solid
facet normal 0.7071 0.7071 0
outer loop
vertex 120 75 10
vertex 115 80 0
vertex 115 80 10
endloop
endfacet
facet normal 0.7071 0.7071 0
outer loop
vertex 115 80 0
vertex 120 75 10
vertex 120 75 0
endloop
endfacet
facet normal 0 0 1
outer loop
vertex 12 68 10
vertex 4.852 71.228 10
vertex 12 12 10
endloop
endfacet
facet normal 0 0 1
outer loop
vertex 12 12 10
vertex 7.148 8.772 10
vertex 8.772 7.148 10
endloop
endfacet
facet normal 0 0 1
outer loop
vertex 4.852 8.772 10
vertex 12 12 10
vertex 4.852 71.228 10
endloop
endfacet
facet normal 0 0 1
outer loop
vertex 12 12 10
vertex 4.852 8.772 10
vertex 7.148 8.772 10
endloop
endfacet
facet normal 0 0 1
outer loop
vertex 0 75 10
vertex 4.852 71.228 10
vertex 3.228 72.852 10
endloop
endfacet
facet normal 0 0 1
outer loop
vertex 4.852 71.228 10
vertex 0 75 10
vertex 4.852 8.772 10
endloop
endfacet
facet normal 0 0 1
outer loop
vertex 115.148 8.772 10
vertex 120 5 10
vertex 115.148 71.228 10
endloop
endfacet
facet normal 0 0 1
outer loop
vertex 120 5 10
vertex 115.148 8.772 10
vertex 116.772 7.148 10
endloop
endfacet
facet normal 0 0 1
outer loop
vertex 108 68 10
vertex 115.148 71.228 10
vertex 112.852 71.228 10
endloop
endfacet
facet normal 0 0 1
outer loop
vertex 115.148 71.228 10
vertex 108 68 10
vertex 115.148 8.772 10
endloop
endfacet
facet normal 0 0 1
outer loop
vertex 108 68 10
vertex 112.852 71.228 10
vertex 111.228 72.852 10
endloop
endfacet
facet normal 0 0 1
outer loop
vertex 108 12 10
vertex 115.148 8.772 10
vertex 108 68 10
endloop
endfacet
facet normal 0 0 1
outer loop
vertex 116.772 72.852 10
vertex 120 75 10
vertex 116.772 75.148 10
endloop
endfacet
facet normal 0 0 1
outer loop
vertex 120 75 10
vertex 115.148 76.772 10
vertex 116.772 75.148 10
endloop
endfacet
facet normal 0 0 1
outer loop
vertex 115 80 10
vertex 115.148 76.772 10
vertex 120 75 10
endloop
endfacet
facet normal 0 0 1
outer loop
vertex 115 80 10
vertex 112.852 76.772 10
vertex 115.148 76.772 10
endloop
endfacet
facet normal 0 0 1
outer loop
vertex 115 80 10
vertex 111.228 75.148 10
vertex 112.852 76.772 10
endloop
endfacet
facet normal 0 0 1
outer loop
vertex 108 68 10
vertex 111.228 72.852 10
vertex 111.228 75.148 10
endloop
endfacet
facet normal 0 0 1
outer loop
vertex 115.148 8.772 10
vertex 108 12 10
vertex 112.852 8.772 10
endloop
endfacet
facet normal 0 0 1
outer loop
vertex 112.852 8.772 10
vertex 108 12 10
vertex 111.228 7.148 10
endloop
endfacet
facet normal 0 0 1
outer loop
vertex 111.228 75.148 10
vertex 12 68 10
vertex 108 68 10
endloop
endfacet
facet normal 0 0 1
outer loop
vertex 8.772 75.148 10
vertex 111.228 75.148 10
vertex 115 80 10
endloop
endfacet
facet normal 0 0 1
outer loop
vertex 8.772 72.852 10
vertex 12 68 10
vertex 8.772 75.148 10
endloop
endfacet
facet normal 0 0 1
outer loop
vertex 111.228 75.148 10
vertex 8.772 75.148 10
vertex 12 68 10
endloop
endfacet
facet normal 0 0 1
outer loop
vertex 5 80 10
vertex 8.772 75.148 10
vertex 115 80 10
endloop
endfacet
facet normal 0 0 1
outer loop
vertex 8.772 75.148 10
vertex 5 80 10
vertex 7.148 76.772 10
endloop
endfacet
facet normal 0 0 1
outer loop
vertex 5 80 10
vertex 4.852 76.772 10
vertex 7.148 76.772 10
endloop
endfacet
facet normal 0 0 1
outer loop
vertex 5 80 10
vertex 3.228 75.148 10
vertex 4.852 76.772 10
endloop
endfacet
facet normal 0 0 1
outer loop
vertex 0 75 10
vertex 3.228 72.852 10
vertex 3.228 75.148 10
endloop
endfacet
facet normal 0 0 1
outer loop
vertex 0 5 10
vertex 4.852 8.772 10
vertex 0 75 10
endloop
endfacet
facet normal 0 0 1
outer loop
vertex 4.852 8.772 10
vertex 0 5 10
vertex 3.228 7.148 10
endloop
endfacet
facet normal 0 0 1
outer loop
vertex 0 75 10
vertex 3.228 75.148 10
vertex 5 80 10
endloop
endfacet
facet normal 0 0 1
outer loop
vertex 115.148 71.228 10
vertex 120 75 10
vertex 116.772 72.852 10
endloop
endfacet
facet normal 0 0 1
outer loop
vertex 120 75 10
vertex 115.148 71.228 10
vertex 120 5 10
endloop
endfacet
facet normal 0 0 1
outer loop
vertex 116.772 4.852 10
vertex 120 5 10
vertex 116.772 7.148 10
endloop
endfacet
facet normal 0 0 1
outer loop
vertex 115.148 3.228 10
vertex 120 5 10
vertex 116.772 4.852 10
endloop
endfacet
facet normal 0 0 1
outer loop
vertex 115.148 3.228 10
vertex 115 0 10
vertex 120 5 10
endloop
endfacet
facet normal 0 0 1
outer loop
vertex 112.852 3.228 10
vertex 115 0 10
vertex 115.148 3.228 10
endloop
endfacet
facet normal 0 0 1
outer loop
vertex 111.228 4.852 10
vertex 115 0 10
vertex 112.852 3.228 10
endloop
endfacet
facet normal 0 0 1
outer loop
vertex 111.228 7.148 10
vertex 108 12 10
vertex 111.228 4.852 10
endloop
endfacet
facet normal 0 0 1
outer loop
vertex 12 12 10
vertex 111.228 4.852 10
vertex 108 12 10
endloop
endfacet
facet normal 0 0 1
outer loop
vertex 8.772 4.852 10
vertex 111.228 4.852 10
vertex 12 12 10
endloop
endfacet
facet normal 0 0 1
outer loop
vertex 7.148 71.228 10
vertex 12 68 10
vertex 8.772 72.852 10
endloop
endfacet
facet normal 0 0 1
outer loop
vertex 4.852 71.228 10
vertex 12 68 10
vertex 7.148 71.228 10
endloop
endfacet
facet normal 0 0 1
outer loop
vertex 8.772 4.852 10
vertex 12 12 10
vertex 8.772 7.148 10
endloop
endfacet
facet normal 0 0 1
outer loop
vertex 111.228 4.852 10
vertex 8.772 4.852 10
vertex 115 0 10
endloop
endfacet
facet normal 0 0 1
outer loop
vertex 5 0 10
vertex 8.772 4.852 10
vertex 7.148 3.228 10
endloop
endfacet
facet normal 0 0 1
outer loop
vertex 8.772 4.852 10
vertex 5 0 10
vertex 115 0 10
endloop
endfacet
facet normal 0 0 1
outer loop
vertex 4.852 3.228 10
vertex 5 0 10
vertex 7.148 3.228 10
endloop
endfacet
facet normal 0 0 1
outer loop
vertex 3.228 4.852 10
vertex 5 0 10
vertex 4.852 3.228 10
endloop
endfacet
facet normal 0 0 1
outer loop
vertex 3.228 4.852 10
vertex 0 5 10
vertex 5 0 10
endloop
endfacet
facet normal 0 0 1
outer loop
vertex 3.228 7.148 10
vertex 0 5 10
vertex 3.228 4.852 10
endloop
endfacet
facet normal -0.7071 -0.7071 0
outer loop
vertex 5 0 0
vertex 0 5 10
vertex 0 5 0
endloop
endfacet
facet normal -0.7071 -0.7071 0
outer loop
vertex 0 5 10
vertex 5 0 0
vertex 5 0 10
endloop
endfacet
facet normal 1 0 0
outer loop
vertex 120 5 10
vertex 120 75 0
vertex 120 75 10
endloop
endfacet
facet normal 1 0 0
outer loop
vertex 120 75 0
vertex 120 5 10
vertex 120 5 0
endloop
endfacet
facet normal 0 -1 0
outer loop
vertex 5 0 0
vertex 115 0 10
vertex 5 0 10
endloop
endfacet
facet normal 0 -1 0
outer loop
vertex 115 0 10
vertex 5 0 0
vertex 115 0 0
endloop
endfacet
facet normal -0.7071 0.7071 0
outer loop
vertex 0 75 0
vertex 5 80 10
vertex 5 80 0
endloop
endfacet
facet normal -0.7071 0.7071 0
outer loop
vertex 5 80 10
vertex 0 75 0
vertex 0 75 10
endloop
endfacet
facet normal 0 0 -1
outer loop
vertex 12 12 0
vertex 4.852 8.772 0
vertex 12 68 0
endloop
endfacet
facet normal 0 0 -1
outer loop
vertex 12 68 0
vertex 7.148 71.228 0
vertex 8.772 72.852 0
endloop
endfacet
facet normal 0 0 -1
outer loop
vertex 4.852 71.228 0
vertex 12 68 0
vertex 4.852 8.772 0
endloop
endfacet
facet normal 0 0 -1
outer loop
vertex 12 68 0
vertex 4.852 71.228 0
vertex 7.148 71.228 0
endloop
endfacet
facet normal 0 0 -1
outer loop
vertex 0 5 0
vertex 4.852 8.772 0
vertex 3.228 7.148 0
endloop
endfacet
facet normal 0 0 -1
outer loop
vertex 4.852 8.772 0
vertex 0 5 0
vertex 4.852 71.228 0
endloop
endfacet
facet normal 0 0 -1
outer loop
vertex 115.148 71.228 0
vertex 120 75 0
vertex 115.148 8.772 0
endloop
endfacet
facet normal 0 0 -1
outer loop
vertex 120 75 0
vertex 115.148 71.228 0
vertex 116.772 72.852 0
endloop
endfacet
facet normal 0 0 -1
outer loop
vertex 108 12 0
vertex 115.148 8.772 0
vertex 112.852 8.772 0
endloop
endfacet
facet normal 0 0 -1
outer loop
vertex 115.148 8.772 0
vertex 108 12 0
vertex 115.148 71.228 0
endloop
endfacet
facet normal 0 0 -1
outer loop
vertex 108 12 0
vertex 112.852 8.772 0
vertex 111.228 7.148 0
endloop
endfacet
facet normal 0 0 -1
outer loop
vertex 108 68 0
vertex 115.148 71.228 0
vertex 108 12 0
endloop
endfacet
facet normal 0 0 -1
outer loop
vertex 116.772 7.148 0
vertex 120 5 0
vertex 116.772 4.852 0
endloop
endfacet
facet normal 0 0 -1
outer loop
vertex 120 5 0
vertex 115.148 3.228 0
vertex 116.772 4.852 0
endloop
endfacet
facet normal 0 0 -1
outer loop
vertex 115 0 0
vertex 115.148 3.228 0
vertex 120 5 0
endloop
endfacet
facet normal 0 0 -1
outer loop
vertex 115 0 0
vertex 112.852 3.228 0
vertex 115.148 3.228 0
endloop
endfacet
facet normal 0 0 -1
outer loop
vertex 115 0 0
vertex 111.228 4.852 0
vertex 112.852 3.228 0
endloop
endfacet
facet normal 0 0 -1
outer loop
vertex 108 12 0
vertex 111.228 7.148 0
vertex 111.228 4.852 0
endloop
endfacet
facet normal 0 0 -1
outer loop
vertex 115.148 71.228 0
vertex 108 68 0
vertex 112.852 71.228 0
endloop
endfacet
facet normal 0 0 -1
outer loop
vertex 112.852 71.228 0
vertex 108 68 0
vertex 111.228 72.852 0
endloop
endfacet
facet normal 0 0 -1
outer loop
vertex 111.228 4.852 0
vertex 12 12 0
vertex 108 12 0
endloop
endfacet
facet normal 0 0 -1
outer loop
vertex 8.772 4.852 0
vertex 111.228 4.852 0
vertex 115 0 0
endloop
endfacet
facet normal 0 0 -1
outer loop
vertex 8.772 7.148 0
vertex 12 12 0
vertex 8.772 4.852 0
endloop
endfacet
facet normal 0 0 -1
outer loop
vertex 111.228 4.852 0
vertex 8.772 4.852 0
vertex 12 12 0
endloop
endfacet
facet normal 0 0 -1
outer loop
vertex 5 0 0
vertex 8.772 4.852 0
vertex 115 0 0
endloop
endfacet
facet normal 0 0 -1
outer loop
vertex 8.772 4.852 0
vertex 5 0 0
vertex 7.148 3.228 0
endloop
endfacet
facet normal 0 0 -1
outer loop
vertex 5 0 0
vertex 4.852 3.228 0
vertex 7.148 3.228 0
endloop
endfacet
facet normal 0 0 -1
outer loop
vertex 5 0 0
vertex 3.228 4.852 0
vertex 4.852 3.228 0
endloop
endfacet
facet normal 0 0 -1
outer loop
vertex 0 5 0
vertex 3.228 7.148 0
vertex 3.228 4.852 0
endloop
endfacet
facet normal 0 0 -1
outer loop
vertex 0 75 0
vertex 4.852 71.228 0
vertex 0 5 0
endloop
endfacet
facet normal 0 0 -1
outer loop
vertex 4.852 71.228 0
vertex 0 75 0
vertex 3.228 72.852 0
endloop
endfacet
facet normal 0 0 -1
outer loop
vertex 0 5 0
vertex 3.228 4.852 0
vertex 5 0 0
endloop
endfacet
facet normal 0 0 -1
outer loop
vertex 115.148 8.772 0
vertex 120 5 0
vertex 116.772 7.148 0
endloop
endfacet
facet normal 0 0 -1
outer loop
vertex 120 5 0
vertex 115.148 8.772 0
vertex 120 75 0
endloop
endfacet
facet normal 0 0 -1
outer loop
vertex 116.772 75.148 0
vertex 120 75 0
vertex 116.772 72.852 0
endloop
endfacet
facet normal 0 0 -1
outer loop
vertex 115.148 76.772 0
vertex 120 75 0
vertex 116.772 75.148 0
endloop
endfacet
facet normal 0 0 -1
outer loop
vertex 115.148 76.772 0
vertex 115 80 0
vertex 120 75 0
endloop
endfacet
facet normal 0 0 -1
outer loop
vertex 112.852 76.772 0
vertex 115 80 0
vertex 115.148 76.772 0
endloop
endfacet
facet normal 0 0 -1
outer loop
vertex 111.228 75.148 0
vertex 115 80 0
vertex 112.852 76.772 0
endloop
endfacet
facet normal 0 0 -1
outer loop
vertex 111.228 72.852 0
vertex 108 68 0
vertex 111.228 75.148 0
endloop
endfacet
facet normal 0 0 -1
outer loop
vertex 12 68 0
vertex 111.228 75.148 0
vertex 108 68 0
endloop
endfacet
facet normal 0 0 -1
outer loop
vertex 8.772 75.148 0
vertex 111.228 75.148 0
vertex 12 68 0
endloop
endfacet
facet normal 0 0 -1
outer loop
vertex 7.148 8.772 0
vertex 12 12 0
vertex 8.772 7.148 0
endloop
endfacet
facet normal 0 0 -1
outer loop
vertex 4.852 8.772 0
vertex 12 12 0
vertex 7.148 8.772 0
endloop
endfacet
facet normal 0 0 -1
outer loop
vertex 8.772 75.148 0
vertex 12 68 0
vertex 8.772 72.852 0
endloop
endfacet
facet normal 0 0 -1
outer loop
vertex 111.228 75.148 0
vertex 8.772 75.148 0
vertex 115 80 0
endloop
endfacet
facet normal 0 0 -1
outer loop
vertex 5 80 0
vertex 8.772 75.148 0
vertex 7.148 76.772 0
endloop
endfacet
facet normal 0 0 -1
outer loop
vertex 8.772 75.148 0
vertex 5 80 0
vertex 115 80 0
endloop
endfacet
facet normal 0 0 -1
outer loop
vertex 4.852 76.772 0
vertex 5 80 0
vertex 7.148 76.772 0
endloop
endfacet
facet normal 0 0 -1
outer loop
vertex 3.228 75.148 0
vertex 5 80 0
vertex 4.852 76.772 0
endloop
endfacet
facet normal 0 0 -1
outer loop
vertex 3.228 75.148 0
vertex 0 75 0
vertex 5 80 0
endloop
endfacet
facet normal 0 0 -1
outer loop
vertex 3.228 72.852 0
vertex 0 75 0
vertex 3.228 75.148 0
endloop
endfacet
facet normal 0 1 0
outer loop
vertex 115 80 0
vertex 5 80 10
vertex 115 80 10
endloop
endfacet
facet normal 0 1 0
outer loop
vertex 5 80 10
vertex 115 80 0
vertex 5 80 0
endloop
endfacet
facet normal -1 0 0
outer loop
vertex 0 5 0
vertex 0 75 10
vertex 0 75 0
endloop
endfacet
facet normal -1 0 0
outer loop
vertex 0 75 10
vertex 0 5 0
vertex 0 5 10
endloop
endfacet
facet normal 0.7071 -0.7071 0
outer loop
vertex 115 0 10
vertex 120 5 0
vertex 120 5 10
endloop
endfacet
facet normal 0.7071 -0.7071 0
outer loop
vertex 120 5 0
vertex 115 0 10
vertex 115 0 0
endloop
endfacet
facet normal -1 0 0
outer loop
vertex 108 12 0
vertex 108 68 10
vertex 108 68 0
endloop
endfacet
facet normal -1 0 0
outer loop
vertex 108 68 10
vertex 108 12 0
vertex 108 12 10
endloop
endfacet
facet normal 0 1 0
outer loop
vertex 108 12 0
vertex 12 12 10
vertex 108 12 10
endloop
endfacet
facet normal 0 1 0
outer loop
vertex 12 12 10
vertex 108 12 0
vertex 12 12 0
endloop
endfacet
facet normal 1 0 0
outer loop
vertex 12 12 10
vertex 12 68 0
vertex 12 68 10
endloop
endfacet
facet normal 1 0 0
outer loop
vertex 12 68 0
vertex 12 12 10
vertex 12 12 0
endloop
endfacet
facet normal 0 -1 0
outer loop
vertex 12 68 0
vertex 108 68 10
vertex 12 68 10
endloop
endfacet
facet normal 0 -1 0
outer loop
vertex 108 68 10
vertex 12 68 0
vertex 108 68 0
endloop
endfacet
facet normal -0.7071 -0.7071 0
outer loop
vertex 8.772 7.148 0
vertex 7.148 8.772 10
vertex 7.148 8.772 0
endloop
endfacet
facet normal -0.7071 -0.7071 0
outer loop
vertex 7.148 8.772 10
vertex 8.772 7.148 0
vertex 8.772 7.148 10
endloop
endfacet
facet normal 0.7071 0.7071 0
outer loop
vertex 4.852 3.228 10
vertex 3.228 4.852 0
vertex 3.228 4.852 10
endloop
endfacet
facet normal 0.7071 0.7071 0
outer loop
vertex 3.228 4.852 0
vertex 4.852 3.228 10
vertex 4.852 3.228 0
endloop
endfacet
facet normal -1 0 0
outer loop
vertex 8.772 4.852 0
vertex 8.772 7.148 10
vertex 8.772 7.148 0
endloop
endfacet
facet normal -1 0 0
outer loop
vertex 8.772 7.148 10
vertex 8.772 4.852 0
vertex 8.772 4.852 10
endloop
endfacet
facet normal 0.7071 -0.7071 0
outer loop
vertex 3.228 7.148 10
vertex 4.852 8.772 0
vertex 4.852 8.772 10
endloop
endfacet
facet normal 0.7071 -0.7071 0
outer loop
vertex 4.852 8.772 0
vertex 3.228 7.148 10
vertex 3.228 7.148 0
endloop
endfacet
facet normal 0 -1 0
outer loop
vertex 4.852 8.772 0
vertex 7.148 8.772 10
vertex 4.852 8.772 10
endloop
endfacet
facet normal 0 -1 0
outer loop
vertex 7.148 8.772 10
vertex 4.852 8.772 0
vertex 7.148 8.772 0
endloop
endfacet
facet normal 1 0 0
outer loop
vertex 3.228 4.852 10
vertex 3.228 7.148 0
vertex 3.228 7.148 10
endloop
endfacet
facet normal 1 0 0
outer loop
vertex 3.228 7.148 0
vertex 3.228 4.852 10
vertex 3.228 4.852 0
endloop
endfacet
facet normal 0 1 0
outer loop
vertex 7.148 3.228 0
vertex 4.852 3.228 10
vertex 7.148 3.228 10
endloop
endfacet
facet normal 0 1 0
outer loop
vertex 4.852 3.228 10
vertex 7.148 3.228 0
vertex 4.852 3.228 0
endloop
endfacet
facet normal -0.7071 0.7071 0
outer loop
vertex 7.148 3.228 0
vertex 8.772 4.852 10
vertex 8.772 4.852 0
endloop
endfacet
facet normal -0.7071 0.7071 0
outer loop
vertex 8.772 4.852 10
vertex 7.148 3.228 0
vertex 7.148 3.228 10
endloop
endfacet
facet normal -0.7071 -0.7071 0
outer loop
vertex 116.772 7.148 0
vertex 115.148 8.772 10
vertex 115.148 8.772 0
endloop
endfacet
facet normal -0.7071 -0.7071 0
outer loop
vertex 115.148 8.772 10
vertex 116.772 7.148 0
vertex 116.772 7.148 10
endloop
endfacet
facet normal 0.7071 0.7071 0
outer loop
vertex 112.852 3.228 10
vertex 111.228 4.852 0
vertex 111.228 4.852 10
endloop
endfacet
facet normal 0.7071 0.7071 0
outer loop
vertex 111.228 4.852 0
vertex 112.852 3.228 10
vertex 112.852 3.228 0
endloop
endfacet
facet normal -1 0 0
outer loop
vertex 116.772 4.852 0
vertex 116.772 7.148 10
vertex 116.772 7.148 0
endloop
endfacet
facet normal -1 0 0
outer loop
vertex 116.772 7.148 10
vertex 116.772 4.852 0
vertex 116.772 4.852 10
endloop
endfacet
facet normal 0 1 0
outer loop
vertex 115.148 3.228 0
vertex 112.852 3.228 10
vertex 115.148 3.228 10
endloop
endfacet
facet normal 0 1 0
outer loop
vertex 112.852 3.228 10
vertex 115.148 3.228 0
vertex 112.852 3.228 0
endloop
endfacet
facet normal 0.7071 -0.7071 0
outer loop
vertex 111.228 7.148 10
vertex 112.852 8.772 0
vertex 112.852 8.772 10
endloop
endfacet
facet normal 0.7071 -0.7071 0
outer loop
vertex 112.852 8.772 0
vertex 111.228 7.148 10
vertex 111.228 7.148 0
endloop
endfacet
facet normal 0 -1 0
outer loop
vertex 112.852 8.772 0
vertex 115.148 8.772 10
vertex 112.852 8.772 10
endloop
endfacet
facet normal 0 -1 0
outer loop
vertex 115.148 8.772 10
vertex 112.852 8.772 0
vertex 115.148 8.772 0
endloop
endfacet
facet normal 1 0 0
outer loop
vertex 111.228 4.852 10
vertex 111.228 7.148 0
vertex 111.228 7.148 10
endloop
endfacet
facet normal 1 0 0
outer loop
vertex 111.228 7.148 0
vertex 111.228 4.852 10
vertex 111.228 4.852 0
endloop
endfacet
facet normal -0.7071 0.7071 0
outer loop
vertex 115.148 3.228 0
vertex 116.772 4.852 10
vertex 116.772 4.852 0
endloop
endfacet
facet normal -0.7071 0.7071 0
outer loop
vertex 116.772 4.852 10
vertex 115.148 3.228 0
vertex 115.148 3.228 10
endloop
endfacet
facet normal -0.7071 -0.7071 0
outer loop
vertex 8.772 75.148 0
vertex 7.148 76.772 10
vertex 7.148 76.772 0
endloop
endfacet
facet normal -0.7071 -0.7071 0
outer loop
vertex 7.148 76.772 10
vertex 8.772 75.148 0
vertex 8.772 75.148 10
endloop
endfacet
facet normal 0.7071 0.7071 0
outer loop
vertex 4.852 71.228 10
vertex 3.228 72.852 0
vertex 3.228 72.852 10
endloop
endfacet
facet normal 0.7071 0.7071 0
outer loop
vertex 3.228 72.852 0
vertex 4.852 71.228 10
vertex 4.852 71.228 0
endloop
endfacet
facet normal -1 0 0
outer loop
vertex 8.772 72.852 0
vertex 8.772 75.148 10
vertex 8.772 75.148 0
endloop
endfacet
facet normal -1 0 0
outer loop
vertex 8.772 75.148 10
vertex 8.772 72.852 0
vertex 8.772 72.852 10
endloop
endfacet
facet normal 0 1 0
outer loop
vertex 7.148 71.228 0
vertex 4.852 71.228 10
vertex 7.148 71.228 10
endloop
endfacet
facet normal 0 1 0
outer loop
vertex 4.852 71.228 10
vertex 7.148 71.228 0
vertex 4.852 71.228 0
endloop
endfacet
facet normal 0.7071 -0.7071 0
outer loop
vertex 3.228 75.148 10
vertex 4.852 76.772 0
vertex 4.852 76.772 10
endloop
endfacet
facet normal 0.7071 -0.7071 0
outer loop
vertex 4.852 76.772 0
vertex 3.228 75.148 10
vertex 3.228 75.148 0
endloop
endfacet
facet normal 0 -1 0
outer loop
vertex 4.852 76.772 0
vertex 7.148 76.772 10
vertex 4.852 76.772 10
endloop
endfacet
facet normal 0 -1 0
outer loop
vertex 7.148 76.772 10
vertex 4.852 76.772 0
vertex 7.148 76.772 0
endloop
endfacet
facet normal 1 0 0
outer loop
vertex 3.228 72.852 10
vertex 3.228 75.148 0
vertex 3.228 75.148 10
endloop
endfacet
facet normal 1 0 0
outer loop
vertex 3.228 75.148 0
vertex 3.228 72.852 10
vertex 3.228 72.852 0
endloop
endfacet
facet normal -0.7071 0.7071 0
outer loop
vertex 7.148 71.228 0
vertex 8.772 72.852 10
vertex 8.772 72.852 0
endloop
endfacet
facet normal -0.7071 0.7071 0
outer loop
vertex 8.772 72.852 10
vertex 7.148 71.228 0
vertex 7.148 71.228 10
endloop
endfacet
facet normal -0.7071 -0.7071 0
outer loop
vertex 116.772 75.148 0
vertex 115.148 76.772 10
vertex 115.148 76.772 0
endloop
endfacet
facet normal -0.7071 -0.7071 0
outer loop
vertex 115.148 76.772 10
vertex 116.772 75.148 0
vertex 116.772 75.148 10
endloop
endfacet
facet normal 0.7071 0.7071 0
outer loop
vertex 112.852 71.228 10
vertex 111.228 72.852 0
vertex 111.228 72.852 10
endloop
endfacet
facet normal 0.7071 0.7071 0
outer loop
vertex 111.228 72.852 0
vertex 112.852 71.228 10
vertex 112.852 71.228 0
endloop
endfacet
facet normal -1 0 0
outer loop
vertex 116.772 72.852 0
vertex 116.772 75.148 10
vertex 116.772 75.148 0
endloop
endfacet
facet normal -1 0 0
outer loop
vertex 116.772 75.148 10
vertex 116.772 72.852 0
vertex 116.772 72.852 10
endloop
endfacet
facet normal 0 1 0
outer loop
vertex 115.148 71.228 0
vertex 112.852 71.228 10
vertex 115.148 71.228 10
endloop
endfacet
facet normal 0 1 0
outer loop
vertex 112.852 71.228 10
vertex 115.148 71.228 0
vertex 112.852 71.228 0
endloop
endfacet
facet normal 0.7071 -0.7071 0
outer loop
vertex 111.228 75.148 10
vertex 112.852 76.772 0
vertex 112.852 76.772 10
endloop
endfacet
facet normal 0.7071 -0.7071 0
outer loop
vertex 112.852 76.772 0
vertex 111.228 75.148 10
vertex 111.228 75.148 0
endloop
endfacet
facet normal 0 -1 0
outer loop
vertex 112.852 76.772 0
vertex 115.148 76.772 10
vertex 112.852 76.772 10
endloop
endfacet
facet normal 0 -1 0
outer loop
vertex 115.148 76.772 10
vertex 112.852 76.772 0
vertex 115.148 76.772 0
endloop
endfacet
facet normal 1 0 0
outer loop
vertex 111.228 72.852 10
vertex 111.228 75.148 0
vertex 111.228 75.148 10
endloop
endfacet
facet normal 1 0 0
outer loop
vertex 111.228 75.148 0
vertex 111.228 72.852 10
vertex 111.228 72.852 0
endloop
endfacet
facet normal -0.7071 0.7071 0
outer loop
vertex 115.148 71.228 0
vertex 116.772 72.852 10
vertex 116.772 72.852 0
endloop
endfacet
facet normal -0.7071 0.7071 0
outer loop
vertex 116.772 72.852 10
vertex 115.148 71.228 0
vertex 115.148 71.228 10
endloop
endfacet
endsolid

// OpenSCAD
$fn = 32;

// ----------------------------------------------------------------------
// Frame plate: 120 x 80 frame, 12 mm rails
// ----------------------------------------------------------------------

// --- parameters (mm) ---
plate_l = 120;            // plate length, X
plate_w = 80;             // plate width, Y
plate_t = 10;             // plate thickness, Z (extrusion height)
corner_c = 5;             // corner chamfer
frame_bar = 12;           // frame rail width
bolt_r = 3;               // corner bolt window radius
bolt_inset = 6;           // bolt centre inset from the edges

win_l = plate_l - 2 * frame_bar;  // window length
win_w = plate_w - 2 * frame_bar;  // window width
bolt_d = 2 * bolt_r;  // corner hole diameter

profile = [[5, 0], [115, 0], [120, 5], [120, 75], [115, 80], [5, 80], [0, 75], [0, 5]];  // primary outline, 8 points, counter clockwise
void_1 = [[12, 12], [108, 12], [108, 68], [12, 68]];  // the window, 4 points
void_2 = [[8.772, 7.148], [7.148, 8.772], [4.852, 8.772], [3.228, 7.148], [3.228, 4.852], [4.852, 3.228], [7.148, 3.228], [8.772, 4.852]];  // corner bolt window, 8 points
void_3 = [[116.772, 7.148], [115.148, 8.772], [112.852, 8.772], [111.228, 7.148], [111.228, 4.852], [112.852, 3.228], [115.148, 3.228], [116.772, 4.852]];  // corner bolt window, 8 points
void_4 = [[8.772, 75.148], [7.148, 76.772], [4.852, 76.772], [3.228, 75.148], [3.228, 72.852], [4.852, 71.228], [7.148, 71.228], [8.772, 72.852]];  // corner bolt window, 8 points
void_5 = [[116.772, 75.148], [115.148, 76.772], [112.852, 76.772], [111.228, 75.148], [111.228, 72.852], [112.852, 71.228], [115.148, 71.228], [116.772, 72.852]];  // corner bolt window, 8 points

// --- the one profile operation ---
difference() {
  linear_extrude(height = plate_t) polygon(points = profile);
  translate([0, 0, -1])
    linear_extrude(height = plate_t + 2) polygon(points = void_1);
  translate([0, 0, -1])
    linear_extrude(height = plate_t + 2) polygon(points = void_2);
  translate([0, 0, -1])
    linear_extrude(height = plate_t + 2) polygon(points = void_3);
  translate([0, 0, -1])
    linear_extrude(height = plate_t + 2) polygon(points = void_4);
  translate([0, 0, -1])
    linear_extrude(height = plate_t + 2) polygon(points = void_5);
}
